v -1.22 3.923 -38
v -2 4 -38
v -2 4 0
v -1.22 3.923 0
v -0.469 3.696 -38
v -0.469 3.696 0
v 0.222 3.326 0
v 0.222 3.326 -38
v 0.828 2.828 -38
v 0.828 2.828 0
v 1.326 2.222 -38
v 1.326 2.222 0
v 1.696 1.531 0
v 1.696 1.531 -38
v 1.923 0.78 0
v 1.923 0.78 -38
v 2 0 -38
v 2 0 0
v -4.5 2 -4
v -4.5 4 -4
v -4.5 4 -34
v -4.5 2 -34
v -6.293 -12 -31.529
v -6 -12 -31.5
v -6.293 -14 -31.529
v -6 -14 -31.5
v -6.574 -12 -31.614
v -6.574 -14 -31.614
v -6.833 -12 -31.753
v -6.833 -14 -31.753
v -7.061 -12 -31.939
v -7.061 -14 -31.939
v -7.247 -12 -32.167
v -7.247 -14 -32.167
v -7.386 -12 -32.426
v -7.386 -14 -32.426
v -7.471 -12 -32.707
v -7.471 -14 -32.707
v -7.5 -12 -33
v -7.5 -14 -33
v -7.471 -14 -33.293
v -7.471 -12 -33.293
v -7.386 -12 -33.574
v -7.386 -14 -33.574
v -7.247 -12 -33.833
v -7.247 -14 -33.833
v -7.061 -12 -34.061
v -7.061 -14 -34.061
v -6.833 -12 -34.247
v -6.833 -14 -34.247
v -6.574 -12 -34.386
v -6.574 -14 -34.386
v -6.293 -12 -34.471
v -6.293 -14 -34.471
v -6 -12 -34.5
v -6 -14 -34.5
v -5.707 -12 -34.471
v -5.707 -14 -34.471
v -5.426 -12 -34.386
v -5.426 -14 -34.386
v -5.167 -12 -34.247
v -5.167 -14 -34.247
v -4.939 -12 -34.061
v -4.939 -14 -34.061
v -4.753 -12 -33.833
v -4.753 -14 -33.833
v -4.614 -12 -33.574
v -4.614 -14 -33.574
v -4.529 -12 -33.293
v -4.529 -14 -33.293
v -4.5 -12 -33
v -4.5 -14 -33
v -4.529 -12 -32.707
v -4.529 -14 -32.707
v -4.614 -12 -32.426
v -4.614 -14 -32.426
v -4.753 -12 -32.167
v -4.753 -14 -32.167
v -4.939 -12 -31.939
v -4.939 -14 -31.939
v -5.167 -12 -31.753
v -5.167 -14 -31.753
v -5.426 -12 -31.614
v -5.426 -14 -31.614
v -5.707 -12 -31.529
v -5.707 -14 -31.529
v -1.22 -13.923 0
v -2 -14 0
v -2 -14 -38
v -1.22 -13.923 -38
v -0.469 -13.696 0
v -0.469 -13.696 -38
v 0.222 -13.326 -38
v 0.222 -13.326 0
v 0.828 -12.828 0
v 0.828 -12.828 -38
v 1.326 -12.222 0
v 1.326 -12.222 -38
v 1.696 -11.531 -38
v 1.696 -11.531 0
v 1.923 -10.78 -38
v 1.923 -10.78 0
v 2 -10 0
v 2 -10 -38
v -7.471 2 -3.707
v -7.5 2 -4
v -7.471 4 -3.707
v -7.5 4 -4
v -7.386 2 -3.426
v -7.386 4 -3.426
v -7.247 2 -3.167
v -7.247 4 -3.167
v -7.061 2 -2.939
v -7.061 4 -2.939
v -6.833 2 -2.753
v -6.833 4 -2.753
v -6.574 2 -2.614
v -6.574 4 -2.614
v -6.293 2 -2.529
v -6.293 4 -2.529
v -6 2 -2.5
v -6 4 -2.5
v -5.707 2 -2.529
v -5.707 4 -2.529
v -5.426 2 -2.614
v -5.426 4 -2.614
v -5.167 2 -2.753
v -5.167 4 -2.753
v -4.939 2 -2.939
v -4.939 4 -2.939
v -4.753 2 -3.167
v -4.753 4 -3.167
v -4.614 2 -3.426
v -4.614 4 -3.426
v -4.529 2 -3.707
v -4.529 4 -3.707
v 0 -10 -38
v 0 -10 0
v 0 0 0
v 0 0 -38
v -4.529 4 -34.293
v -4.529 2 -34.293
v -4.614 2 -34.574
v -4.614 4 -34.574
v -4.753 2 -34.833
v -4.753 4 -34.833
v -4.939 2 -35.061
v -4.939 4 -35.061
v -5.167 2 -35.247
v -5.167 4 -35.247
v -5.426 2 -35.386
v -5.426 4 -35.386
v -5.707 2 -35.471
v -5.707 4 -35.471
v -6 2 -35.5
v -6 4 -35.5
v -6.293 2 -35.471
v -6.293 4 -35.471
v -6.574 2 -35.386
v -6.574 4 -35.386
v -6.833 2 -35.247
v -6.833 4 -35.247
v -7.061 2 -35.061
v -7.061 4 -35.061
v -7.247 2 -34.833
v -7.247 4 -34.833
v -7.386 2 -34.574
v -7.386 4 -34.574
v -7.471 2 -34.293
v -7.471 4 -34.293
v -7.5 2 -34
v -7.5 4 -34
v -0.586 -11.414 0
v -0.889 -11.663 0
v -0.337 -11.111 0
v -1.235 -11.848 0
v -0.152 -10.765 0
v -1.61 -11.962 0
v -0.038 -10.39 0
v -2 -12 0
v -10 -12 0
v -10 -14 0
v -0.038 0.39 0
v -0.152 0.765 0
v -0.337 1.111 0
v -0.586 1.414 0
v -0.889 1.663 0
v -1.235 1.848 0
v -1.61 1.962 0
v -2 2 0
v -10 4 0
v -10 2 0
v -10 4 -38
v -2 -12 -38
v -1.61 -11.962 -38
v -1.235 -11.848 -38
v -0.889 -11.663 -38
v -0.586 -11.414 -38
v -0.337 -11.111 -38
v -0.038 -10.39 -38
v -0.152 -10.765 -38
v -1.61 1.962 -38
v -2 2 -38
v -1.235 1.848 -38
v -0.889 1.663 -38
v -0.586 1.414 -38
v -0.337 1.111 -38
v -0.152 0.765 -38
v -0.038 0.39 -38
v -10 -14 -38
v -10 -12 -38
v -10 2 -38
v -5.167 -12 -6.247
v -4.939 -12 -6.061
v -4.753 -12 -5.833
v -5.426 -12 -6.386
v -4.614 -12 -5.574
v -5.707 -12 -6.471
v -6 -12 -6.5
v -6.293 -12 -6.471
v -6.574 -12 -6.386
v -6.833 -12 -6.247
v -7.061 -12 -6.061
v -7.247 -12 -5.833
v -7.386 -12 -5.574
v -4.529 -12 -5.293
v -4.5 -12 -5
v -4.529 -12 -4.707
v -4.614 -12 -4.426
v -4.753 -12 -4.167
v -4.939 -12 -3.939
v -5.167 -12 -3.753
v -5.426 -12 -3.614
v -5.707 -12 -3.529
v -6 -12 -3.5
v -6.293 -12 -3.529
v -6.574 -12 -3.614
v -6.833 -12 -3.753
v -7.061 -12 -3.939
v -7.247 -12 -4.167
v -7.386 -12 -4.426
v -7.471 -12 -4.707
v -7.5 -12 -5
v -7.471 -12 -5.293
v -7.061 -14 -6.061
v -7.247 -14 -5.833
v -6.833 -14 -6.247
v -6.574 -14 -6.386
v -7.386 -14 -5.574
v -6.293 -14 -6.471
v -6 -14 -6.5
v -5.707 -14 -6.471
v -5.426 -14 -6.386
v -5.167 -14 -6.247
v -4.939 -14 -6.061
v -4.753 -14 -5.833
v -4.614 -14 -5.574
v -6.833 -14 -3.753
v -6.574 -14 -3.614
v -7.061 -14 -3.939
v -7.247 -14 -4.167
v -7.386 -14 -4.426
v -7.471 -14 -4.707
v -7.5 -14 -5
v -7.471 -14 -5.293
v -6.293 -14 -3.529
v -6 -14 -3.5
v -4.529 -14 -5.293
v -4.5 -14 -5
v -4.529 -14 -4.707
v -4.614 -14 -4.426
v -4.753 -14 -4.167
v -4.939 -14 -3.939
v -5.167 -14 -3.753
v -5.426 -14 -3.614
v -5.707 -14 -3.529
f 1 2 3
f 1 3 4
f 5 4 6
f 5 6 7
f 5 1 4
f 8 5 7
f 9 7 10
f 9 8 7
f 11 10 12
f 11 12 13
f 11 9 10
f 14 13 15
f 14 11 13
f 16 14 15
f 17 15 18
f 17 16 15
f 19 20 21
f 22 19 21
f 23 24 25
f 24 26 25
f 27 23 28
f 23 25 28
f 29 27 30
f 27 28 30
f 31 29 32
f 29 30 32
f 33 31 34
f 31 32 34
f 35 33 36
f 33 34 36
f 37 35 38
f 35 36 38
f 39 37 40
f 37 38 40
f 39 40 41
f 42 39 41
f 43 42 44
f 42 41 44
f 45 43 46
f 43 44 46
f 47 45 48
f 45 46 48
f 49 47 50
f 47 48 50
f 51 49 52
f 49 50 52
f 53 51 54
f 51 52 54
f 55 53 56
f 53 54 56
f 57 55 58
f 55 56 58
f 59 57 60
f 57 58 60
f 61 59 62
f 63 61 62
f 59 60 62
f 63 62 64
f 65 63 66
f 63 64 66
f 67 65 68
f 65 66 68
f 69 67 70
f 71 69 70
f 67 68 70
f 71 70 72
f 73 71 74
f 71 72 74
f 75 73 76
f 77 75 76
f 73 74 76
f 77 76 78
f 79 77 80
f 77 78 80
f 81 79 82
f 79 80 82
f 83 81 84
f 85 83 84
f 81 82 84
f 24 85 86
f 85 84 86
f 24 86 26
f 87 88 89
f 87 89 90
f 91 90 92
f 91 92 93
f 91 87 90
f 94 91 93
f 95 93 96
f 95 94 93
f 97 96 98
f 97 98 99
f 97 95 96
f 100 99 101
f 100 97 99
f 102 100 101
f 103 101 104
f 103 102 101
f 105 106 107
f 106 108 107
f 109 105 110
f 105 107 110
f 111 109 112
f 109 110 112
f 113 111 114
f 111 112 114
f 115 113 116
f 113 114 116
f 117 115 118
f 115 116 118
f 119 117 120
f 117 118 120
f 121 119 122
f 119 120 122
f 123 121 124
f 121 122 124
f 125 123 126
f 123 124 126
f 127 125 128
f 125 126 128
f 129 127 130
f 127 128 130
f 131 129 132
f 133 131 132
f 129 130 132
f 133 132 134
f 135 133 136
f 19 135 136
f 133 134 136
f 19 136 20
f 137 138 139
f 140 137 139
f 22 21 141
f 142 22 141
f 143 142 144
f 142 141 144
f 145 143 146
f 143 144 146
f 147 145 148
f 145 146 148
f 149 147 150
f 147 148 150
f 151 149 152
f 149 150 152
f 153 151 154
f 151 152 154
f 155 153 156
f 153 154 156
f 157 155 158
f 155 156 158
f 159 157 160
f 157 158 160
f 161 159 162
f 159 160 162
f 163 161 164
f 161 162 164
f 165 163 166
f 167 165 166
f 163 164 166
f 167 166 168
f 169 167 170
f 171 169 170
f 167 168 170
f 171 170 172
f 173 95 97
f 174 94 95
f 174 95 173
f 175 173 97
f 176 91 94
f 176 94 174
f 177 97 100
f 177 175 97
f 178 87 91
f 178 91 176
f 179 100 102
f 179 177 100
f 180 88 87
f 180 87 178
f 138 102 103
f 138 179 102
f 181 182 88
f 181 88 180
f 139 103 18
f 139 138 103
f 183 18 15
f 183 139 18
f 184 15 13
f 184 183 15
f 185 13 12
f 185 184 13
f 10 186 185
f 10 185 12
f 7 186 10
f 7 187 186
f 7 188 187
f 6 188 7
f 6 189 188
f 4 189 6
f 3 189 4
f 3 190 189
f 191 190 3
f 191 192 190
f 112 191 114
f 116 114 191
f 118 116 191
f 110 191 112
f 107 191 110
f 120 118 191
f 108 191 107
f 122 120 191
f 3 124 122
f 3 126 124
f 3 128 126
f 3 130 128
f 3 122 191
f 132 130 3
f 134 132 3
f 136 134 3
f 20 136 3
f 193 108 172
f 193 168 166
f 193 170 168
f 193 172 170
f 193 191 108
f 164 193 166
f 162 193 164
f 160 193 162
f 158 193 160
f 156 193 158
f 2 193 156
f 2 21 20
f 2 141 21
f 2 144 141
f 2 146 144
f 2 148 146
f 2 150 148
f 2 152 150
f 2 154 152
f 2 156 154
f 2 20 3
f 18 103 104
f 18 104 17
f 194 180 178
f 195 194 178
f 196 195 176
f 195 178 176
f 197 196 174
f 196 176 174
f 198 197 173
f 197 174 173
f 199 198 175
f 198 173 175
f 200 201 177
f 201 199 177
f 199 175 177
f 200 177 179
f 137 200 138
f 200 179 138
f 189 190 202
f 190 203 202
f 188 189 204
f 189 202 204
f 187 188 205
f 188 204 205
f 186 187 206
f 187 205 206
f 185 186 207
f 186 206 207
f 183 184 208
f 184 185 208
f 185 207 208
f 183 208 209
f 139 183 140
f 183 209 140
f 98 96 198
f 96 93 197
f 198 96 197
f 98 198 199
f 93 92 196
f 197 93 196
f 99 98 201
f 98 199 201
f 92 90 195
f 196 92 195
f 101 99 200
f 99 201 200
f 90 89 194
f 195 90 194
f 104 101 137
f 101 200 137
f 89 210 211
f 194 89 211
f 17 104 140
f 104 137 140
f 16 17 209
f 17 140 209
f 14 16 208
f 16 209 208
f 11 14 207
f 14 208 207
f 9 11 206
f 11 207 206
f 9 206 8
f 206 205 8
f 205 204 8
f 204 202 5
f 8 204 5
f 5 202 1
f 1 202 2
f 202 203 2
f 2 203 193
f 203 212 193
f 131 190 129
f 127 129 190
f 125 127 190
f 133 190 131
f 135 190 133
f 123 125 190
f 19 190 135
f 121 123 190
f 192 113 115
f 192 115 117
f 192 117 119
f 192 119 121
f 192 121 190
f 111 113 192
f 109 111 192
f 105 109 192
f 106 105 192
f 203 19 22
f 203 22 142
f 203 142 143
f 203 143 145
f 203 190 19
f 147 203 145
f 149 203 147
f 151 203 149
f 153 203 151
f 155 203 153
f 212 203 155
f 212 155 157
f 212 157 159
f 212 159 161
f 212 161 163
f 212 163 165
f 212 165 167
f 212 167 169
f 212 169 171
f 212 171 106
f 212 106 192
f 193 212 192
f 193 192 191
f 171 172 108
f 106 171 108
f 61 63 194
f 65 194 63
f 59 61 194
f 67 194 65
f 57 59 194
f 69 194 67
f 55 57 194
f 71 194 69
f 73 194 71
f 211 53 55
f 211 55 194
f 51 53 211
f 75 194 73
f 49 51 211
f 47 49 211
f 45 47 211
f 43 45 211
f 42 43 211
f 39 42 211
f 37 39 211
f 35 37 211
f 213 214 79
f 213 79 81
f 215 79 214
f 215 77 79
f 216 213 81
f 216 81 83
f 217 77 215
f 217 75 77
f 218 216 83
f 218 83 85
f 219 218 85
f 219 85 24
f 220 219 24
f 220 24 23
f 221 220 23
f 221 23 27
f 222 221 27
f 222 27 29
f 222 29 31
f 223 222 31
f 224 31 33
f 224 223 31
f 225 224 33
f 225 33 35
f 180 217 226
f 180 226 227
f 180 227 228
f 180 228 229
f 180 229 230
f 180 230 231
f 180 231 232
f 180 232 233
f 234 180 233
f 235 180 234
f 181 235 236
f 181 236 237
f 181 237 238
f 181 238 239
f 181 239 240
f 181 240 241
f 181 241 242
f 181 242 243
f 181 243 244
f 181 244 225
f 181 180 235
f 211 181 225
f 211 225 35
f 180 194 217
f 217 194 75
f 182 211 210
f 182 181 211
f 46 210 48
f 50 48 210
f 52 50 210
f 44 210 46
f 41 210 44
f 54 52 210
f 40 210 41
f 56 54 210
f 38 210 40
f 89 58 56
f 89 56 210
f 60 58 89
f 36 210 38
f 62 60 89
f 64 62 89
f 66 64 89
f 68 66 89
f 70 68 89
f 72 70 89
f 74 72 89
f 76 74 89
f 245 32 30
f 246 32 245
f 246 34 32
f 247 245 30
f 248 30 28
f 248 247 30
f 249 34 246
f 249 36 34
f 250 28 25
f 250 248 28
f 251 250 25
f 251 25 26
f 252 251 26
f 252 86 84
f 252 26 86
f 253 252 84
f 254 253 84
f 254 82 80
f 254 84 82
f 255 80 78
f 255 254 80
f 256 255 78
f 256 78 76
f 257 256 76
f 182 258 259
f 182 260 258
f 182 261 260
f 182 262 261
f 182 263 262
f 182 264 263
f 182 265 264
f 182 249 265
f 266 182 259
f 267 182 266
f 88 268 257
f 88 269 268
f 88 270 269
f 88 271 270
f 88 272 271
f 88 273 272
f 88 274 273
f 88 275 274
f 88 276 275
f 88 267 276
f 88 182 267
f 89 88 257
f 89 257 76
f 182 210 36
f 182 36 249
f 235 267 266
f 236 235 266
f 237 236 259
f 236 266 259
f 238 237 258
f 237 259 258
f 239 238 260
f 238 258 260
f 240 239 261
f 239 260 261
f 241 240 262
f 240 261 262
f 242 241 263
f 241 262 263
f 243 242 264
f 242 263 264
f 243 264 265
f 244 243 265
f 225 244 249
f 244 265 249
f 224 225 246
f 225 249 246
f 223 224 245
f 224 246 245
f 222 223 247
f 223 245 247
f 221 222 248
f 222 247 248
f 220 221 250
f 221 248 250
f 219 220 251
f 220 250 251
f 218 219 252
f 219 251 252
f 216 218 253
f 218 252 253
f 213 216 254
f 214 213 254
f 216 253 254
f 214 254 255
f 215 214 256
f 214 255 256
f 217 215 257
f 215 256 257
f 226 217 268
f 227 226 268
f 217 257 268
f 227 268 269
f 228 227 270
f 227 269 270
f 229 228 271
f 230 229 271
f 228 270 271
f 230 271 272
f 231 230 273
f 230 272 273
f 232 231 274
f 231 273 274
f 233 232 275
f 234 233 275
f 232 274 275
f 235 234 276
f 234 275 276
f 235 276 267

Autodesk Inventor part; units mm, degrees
ref_plane "YZ Plane" through (0, 0, 0) normal (1, 0, 0) x (0, 1, 0)
ref_plane "XZ Plane" through (0, 0, 0) normal (0, 1, 0) x (-1, 0, 0)
ref_plane "XY Plane" through (0, 0, 0) normal (0, 0, 1) x (1, 0, 0)
sketch "スケッチ1" plane through (0, 0, 0) normal (1, 0, 0) x (0, 1, 0)
  line L0 (0, 0) -> (0, -38)
  line L1 (0, -38) -> (-10, -38)
  line L2 (-10, -38) -> (-10, 0)
  line L3 (-10, 0) -> (0, 0)
  dimension "d0" = 38
  dimension "d2" = 10
extrude "プレート1" add sketch "スケッチ1" along normal blind 2
sketch "スケッチ14" plane through (-2, 2, -38) normal (0, 1, 0) x (-1, 0, 0)
  line L0 (0, 38) -> (0, 0)
  line L1 (0, 0) -> (8, 0)
  line L2 (8, 0) -> (8, 38)
  line L3 (8, 38) -> (0, 38)
edge flange "フランジ1" height 12 angle 90 thickness 2 bend radius 2 thickness toward (0, 1, 0) relief tear relief width 2 relief depth 1 edges at (0, 0, -19) wall of the first edge with corners at (-2, 2, 0) (-2, 2, -38) (-10, 2, -38) (-10, 2, 0)
bend "曲げ26"
corner "コーナー1"
sketch "スケッチ15" plane through (-2, -12, 0) normal (0, -1, 0) x (1, 0, 0)
  line L0 (0, -38) -> (0, 0)
  line L1 (0, 0) -> (-8, 0)
  line L2 (-8, 0) -> (-8, -38)
  line L3 (-8, -38) -> (0, -38)
edge flange "フランジ2" height 12 angle 90 thickness 2 bend radius 2 thickness toward (0, -1, 0) relief tear relief width 2 relief depth 1 edges at (0, -10, -19) wall of the first edge with corners at (-2, -12, -38) (-2, -12, 0) (-10, -12, 0) (-10, -12, -38)
bend "曲げ27"
corner "コーナー2"
sketch "スケッチ16" plane through (-10, 4, 0) normal (0, 1, 0) x (1, 0, 0)
  line L0 (5.5, 4) -> (5.5, 34)
  arc A0 (5.5, 34) -> (2.5, 34) centre (4, 34) ccw
  line L1 (2.5, 34) -> (2.5, 4)
  arc A1 (2.5, 4) -> (5.5, 4) centre (4, 4) ccw
  line L2 (0, 38) -> (8, 38) projected
  line L3 (8, 0) -> (0, 0) projected
  point P0 (10, 0)
  point P1 (4, 38)
  dimension "d192" = 1.5
  dimension "d193" = 4
  dimension "d194" = 4
extrude "押し出し1" cut sketch "スケッチ16" against normal blind 10
sketch "スケッチ17" plane through (-10, -12, 0) normal (0, 1, 0) x (1, 0, 0)
  line L0 (0, 0) -> (8, 0) projected
  line L1 (0, 38) -> (8, 38) projected
  point P0 (10, 0)
  point P1 (4, 5)
  point P2 (4, 33)
  point P3 (4, 0)
  point P4 (4, 38)
  dimension "d197" = 5
  dimension "d198" = 5
hole "穴1" at (-6, -12, -5) at (-6, -12, -33) direction (0, -1, 0) diameter 3 end through all
equation "\"d204\" = Thickness"
equation "\"d3\" = Thickness"
equation "\"d172\" = BendReliefWidth"
equation "\"d173\" = BendReliefDepth"
equation "\"d174\" = MinimumRemnant"
equation "\"d175\" = TransitionRadius"
equation "\"d178\" = BendRadius"
equation "\"d179\" = CornerReliefSize"
equation "\"d180\" = GapSize"
equation "\"d181\" = JacobiRadiusSize"
equation "\"d182\" = BendReliefWidth"
equation "\"d183\" = BendReliefDepth"
equation "\"d184\" = MinimumRemnant"
equation "\"d185\" = TransitionRadius"
equation "\"d188\" = BendRadius"
equation "\"d189\" = CornerReliefSize"
equation "\"d190\" = GapSize"
equation "\"d191\" = JacobiRadiusSize"
equation "\"BendRadius\" = Thickness"
equation "\"BendReliefWidth\" = Thickness"
equation "\"BendReliefDepth\" = 0.5 * Thickness"
equation "\"CornerReliefSize\" = 4 * Thickness"
equation "\"MinimumRemnant\" = 2 * Thickness"
equation "\"TransitionRadius\" = BendRadius"
equation "\"JacobiRadiusSize\" = BendRadius"
equation "\"GapSize\" = Thickness"
equation "\"Thickness\" = 2"
properties part number "frame_front" material "アルミニウム 6061"
